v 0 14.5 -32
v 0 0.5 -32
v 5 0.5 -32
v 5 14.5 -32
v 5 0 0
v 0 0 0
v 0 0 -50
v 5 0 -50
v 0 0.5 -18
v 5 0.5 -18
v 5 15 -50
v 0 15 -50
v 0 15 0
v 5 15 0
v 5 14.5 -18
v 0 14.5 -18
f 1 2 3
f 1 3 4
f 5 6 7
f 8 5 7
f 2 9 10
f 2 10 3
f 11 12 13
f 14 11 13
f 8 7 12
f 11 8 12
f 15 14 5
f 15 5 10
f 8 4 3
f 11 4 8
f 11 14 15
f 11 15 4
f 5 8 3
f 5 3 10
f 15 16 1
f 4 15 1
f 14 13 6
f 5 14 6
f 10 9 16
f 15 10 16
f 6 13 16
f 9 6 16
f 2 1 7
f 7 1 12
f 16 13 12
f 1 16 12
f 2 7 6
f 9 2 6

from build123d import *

# Parameters (mm, degrees)
SKETCH1_W           = 14
SKETCH1_H           = 14
BOSS_EXTRUDE1_DEPTH = 5


with BuildPart() as part:
    # Sketch1 → Boss-Extrude1 (new body)
    with BuildSketch(Plane(origin=(0, 0, 0), x_dir=(0, 0, -1), z_dir=(1, 0, 0))):
        Polygon((50, 15), (18, 15), (0, 15), (0, 0), (50, 0), align=None)
        with Locations((25, 7.5)):
            Rectangle(SKETCH1_W, SKETCH1_H, mode=Mode.SUBTRACT)
    extrude(amount=BOSS_EXTRUDE1_DEPTH)


solid = part.part
